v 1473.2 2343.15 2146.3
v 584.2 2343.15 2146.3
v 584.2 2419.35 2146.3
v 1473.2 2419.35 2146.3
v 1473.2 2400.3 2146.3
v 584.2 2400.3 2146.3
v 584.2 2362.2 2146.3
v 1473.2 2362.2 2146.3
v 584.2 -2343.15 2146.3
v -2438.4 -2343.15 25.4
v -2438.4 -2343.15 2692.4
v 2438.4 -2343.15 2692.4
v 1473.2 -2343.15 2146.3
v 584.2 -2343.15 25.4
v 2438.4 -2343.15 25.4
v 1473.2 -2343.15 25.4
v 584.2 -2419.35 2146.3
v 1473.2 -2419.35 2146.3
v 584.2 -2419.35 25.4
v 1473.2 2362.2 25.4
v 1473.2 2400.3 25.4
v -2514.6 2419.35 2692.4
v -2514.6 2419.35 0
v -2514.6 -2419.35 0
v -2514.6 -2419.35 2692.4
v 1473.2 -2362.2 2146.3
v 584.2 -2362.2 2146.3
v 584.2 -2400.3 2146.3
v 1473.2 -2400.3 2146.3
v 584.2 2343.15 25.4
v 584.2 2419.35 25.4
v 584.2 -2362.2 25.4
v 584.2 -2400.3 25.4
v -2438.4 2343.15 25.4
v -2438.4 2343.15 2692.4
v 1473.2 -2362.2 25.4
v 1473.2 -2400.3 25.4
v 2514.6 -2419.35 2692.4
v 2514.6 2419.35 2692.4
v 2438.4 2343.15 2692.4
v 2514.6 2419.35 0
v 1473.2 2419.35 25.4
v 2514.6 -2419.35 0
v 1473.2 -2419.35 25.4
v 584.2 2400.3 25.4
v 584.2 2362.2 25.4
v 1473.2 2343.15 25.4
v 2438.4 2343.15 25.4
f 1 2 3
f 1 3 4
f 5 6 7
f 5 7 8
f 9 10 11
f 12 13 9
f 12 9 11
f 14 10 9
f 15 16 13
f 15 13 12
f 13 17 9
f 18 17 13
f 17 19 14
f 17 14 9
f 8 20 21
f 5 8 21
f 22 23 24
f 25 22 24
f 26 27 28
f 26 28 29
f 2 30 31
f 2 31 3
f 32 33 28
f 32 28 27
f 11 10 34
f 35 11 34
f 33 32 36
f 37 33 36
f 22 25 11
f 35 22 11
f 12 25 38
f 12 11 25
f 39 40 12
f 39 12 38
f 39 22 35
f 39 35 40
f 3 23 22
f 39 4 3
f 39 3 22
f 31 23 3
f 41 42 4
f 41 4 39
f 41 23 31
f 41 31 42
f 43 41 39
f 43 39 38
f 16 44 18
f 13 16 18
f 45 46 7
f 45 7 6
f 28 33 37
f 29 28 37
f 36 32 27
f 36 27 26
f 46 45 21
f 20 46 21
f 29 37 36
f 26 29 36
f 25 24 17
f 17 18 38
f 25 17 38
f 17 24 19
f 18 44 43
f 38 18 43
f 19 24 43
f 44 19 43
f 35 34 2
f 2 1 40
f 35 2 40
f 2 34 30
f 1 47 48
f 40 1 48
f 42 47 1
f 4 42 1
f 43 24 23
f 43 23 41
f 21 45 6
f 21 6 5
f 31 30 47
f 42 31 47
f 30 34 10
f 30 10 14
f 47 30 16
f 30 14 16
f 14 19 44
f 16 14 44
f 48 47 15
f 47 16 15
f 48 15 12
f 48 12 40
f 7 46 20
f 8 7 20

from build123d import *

# Parameters (mm, degrees)
F0_W     = 4876.8
F0_H     = 4686.3
F1_DEPTH = 25.4
F2_W     = 5029.2
F2_H     = 4838.7
F2_W_2   = 4876.8
F2_H_2   = 4686.3
F3_DEPTH = 2667
F4_W     = 889
F4_H     = 2120.9
F5_DEPTH = 4838.701
F6_W     = 5029.2
F6_H     = 4838.7
F6_W_2   = 4876.8
F6_H_2   = 4686.3
F7_DEPTH = 25.4
F8_W     = 889
F8_H     = 38.1
F9_DEPTH = 2120.9


with BuildPart() as f1:
    # F0 (on Top) → F1 (new body)
    with BuildSketch(Plane.XY):
        Rectangle(F0_W, F0_H)
    extrude(amount=F1_DEPTH)



with BuildPart() as f3:
    # F2 (on face) → F3 (new body)
    with BuildSketch(Plane.XY.offset(25.4)):
        Rectangle(F2_W, F2_H)
        Rectangle(F2_W_2, F2_H_2, mode=Mode.SUBTRACT)
    extrude(amount=F3_DEPTH)

    # F4 (on face) → F5 (cut, through all)
    with BuildSketch(Plane.XZ.offset(2419.35)):
        with Locations((1028.7, 1085.85)):
            Rectangle(F4_W, F4_H)
    extrude(amount=-F5_DEPTH, mode=Mode.SUBTRACT)


with BuildPart() as f1_1:
    add(f1.part)

    add(f3.part)  # F7 merges F3
    # F6 (on face) → F7 (join)
    with BuildSketch(Plane(origin=(0, 0, 0), x_dir=(1, 0, 0), z_dir=(0, 0, -1))):
        Rectangle(F6_W, F6_H)
        Rectangle(F6_W_2, F6_H_2, mode=Mode.SUBTRACT)
    extrude(amount=-F7_DEPTH)


with BuildPart() as f9:
    # F8 (on face) → F9 (new body)
    with BuildSketch(Plane.XY.offset(25.4)):
        with Locations((1028.7, -2381.25)):
            Rectangle(F8_W, F8_H)
    extrude(amount=F9_DEPTH)


with BuildPart() as f9b:
    # F8 (on face) → F9, piece 2 (new body)
    with BuildSketch(Plane.XY.offset(25.4)):
        with Locations((1028.7, 2381.25)):
            Rectangle(F8_W, F8_H)
    extrude(amount=F9_DEPTH)


solid = Compound([f1_1.part, f9.part, f9b.part])
